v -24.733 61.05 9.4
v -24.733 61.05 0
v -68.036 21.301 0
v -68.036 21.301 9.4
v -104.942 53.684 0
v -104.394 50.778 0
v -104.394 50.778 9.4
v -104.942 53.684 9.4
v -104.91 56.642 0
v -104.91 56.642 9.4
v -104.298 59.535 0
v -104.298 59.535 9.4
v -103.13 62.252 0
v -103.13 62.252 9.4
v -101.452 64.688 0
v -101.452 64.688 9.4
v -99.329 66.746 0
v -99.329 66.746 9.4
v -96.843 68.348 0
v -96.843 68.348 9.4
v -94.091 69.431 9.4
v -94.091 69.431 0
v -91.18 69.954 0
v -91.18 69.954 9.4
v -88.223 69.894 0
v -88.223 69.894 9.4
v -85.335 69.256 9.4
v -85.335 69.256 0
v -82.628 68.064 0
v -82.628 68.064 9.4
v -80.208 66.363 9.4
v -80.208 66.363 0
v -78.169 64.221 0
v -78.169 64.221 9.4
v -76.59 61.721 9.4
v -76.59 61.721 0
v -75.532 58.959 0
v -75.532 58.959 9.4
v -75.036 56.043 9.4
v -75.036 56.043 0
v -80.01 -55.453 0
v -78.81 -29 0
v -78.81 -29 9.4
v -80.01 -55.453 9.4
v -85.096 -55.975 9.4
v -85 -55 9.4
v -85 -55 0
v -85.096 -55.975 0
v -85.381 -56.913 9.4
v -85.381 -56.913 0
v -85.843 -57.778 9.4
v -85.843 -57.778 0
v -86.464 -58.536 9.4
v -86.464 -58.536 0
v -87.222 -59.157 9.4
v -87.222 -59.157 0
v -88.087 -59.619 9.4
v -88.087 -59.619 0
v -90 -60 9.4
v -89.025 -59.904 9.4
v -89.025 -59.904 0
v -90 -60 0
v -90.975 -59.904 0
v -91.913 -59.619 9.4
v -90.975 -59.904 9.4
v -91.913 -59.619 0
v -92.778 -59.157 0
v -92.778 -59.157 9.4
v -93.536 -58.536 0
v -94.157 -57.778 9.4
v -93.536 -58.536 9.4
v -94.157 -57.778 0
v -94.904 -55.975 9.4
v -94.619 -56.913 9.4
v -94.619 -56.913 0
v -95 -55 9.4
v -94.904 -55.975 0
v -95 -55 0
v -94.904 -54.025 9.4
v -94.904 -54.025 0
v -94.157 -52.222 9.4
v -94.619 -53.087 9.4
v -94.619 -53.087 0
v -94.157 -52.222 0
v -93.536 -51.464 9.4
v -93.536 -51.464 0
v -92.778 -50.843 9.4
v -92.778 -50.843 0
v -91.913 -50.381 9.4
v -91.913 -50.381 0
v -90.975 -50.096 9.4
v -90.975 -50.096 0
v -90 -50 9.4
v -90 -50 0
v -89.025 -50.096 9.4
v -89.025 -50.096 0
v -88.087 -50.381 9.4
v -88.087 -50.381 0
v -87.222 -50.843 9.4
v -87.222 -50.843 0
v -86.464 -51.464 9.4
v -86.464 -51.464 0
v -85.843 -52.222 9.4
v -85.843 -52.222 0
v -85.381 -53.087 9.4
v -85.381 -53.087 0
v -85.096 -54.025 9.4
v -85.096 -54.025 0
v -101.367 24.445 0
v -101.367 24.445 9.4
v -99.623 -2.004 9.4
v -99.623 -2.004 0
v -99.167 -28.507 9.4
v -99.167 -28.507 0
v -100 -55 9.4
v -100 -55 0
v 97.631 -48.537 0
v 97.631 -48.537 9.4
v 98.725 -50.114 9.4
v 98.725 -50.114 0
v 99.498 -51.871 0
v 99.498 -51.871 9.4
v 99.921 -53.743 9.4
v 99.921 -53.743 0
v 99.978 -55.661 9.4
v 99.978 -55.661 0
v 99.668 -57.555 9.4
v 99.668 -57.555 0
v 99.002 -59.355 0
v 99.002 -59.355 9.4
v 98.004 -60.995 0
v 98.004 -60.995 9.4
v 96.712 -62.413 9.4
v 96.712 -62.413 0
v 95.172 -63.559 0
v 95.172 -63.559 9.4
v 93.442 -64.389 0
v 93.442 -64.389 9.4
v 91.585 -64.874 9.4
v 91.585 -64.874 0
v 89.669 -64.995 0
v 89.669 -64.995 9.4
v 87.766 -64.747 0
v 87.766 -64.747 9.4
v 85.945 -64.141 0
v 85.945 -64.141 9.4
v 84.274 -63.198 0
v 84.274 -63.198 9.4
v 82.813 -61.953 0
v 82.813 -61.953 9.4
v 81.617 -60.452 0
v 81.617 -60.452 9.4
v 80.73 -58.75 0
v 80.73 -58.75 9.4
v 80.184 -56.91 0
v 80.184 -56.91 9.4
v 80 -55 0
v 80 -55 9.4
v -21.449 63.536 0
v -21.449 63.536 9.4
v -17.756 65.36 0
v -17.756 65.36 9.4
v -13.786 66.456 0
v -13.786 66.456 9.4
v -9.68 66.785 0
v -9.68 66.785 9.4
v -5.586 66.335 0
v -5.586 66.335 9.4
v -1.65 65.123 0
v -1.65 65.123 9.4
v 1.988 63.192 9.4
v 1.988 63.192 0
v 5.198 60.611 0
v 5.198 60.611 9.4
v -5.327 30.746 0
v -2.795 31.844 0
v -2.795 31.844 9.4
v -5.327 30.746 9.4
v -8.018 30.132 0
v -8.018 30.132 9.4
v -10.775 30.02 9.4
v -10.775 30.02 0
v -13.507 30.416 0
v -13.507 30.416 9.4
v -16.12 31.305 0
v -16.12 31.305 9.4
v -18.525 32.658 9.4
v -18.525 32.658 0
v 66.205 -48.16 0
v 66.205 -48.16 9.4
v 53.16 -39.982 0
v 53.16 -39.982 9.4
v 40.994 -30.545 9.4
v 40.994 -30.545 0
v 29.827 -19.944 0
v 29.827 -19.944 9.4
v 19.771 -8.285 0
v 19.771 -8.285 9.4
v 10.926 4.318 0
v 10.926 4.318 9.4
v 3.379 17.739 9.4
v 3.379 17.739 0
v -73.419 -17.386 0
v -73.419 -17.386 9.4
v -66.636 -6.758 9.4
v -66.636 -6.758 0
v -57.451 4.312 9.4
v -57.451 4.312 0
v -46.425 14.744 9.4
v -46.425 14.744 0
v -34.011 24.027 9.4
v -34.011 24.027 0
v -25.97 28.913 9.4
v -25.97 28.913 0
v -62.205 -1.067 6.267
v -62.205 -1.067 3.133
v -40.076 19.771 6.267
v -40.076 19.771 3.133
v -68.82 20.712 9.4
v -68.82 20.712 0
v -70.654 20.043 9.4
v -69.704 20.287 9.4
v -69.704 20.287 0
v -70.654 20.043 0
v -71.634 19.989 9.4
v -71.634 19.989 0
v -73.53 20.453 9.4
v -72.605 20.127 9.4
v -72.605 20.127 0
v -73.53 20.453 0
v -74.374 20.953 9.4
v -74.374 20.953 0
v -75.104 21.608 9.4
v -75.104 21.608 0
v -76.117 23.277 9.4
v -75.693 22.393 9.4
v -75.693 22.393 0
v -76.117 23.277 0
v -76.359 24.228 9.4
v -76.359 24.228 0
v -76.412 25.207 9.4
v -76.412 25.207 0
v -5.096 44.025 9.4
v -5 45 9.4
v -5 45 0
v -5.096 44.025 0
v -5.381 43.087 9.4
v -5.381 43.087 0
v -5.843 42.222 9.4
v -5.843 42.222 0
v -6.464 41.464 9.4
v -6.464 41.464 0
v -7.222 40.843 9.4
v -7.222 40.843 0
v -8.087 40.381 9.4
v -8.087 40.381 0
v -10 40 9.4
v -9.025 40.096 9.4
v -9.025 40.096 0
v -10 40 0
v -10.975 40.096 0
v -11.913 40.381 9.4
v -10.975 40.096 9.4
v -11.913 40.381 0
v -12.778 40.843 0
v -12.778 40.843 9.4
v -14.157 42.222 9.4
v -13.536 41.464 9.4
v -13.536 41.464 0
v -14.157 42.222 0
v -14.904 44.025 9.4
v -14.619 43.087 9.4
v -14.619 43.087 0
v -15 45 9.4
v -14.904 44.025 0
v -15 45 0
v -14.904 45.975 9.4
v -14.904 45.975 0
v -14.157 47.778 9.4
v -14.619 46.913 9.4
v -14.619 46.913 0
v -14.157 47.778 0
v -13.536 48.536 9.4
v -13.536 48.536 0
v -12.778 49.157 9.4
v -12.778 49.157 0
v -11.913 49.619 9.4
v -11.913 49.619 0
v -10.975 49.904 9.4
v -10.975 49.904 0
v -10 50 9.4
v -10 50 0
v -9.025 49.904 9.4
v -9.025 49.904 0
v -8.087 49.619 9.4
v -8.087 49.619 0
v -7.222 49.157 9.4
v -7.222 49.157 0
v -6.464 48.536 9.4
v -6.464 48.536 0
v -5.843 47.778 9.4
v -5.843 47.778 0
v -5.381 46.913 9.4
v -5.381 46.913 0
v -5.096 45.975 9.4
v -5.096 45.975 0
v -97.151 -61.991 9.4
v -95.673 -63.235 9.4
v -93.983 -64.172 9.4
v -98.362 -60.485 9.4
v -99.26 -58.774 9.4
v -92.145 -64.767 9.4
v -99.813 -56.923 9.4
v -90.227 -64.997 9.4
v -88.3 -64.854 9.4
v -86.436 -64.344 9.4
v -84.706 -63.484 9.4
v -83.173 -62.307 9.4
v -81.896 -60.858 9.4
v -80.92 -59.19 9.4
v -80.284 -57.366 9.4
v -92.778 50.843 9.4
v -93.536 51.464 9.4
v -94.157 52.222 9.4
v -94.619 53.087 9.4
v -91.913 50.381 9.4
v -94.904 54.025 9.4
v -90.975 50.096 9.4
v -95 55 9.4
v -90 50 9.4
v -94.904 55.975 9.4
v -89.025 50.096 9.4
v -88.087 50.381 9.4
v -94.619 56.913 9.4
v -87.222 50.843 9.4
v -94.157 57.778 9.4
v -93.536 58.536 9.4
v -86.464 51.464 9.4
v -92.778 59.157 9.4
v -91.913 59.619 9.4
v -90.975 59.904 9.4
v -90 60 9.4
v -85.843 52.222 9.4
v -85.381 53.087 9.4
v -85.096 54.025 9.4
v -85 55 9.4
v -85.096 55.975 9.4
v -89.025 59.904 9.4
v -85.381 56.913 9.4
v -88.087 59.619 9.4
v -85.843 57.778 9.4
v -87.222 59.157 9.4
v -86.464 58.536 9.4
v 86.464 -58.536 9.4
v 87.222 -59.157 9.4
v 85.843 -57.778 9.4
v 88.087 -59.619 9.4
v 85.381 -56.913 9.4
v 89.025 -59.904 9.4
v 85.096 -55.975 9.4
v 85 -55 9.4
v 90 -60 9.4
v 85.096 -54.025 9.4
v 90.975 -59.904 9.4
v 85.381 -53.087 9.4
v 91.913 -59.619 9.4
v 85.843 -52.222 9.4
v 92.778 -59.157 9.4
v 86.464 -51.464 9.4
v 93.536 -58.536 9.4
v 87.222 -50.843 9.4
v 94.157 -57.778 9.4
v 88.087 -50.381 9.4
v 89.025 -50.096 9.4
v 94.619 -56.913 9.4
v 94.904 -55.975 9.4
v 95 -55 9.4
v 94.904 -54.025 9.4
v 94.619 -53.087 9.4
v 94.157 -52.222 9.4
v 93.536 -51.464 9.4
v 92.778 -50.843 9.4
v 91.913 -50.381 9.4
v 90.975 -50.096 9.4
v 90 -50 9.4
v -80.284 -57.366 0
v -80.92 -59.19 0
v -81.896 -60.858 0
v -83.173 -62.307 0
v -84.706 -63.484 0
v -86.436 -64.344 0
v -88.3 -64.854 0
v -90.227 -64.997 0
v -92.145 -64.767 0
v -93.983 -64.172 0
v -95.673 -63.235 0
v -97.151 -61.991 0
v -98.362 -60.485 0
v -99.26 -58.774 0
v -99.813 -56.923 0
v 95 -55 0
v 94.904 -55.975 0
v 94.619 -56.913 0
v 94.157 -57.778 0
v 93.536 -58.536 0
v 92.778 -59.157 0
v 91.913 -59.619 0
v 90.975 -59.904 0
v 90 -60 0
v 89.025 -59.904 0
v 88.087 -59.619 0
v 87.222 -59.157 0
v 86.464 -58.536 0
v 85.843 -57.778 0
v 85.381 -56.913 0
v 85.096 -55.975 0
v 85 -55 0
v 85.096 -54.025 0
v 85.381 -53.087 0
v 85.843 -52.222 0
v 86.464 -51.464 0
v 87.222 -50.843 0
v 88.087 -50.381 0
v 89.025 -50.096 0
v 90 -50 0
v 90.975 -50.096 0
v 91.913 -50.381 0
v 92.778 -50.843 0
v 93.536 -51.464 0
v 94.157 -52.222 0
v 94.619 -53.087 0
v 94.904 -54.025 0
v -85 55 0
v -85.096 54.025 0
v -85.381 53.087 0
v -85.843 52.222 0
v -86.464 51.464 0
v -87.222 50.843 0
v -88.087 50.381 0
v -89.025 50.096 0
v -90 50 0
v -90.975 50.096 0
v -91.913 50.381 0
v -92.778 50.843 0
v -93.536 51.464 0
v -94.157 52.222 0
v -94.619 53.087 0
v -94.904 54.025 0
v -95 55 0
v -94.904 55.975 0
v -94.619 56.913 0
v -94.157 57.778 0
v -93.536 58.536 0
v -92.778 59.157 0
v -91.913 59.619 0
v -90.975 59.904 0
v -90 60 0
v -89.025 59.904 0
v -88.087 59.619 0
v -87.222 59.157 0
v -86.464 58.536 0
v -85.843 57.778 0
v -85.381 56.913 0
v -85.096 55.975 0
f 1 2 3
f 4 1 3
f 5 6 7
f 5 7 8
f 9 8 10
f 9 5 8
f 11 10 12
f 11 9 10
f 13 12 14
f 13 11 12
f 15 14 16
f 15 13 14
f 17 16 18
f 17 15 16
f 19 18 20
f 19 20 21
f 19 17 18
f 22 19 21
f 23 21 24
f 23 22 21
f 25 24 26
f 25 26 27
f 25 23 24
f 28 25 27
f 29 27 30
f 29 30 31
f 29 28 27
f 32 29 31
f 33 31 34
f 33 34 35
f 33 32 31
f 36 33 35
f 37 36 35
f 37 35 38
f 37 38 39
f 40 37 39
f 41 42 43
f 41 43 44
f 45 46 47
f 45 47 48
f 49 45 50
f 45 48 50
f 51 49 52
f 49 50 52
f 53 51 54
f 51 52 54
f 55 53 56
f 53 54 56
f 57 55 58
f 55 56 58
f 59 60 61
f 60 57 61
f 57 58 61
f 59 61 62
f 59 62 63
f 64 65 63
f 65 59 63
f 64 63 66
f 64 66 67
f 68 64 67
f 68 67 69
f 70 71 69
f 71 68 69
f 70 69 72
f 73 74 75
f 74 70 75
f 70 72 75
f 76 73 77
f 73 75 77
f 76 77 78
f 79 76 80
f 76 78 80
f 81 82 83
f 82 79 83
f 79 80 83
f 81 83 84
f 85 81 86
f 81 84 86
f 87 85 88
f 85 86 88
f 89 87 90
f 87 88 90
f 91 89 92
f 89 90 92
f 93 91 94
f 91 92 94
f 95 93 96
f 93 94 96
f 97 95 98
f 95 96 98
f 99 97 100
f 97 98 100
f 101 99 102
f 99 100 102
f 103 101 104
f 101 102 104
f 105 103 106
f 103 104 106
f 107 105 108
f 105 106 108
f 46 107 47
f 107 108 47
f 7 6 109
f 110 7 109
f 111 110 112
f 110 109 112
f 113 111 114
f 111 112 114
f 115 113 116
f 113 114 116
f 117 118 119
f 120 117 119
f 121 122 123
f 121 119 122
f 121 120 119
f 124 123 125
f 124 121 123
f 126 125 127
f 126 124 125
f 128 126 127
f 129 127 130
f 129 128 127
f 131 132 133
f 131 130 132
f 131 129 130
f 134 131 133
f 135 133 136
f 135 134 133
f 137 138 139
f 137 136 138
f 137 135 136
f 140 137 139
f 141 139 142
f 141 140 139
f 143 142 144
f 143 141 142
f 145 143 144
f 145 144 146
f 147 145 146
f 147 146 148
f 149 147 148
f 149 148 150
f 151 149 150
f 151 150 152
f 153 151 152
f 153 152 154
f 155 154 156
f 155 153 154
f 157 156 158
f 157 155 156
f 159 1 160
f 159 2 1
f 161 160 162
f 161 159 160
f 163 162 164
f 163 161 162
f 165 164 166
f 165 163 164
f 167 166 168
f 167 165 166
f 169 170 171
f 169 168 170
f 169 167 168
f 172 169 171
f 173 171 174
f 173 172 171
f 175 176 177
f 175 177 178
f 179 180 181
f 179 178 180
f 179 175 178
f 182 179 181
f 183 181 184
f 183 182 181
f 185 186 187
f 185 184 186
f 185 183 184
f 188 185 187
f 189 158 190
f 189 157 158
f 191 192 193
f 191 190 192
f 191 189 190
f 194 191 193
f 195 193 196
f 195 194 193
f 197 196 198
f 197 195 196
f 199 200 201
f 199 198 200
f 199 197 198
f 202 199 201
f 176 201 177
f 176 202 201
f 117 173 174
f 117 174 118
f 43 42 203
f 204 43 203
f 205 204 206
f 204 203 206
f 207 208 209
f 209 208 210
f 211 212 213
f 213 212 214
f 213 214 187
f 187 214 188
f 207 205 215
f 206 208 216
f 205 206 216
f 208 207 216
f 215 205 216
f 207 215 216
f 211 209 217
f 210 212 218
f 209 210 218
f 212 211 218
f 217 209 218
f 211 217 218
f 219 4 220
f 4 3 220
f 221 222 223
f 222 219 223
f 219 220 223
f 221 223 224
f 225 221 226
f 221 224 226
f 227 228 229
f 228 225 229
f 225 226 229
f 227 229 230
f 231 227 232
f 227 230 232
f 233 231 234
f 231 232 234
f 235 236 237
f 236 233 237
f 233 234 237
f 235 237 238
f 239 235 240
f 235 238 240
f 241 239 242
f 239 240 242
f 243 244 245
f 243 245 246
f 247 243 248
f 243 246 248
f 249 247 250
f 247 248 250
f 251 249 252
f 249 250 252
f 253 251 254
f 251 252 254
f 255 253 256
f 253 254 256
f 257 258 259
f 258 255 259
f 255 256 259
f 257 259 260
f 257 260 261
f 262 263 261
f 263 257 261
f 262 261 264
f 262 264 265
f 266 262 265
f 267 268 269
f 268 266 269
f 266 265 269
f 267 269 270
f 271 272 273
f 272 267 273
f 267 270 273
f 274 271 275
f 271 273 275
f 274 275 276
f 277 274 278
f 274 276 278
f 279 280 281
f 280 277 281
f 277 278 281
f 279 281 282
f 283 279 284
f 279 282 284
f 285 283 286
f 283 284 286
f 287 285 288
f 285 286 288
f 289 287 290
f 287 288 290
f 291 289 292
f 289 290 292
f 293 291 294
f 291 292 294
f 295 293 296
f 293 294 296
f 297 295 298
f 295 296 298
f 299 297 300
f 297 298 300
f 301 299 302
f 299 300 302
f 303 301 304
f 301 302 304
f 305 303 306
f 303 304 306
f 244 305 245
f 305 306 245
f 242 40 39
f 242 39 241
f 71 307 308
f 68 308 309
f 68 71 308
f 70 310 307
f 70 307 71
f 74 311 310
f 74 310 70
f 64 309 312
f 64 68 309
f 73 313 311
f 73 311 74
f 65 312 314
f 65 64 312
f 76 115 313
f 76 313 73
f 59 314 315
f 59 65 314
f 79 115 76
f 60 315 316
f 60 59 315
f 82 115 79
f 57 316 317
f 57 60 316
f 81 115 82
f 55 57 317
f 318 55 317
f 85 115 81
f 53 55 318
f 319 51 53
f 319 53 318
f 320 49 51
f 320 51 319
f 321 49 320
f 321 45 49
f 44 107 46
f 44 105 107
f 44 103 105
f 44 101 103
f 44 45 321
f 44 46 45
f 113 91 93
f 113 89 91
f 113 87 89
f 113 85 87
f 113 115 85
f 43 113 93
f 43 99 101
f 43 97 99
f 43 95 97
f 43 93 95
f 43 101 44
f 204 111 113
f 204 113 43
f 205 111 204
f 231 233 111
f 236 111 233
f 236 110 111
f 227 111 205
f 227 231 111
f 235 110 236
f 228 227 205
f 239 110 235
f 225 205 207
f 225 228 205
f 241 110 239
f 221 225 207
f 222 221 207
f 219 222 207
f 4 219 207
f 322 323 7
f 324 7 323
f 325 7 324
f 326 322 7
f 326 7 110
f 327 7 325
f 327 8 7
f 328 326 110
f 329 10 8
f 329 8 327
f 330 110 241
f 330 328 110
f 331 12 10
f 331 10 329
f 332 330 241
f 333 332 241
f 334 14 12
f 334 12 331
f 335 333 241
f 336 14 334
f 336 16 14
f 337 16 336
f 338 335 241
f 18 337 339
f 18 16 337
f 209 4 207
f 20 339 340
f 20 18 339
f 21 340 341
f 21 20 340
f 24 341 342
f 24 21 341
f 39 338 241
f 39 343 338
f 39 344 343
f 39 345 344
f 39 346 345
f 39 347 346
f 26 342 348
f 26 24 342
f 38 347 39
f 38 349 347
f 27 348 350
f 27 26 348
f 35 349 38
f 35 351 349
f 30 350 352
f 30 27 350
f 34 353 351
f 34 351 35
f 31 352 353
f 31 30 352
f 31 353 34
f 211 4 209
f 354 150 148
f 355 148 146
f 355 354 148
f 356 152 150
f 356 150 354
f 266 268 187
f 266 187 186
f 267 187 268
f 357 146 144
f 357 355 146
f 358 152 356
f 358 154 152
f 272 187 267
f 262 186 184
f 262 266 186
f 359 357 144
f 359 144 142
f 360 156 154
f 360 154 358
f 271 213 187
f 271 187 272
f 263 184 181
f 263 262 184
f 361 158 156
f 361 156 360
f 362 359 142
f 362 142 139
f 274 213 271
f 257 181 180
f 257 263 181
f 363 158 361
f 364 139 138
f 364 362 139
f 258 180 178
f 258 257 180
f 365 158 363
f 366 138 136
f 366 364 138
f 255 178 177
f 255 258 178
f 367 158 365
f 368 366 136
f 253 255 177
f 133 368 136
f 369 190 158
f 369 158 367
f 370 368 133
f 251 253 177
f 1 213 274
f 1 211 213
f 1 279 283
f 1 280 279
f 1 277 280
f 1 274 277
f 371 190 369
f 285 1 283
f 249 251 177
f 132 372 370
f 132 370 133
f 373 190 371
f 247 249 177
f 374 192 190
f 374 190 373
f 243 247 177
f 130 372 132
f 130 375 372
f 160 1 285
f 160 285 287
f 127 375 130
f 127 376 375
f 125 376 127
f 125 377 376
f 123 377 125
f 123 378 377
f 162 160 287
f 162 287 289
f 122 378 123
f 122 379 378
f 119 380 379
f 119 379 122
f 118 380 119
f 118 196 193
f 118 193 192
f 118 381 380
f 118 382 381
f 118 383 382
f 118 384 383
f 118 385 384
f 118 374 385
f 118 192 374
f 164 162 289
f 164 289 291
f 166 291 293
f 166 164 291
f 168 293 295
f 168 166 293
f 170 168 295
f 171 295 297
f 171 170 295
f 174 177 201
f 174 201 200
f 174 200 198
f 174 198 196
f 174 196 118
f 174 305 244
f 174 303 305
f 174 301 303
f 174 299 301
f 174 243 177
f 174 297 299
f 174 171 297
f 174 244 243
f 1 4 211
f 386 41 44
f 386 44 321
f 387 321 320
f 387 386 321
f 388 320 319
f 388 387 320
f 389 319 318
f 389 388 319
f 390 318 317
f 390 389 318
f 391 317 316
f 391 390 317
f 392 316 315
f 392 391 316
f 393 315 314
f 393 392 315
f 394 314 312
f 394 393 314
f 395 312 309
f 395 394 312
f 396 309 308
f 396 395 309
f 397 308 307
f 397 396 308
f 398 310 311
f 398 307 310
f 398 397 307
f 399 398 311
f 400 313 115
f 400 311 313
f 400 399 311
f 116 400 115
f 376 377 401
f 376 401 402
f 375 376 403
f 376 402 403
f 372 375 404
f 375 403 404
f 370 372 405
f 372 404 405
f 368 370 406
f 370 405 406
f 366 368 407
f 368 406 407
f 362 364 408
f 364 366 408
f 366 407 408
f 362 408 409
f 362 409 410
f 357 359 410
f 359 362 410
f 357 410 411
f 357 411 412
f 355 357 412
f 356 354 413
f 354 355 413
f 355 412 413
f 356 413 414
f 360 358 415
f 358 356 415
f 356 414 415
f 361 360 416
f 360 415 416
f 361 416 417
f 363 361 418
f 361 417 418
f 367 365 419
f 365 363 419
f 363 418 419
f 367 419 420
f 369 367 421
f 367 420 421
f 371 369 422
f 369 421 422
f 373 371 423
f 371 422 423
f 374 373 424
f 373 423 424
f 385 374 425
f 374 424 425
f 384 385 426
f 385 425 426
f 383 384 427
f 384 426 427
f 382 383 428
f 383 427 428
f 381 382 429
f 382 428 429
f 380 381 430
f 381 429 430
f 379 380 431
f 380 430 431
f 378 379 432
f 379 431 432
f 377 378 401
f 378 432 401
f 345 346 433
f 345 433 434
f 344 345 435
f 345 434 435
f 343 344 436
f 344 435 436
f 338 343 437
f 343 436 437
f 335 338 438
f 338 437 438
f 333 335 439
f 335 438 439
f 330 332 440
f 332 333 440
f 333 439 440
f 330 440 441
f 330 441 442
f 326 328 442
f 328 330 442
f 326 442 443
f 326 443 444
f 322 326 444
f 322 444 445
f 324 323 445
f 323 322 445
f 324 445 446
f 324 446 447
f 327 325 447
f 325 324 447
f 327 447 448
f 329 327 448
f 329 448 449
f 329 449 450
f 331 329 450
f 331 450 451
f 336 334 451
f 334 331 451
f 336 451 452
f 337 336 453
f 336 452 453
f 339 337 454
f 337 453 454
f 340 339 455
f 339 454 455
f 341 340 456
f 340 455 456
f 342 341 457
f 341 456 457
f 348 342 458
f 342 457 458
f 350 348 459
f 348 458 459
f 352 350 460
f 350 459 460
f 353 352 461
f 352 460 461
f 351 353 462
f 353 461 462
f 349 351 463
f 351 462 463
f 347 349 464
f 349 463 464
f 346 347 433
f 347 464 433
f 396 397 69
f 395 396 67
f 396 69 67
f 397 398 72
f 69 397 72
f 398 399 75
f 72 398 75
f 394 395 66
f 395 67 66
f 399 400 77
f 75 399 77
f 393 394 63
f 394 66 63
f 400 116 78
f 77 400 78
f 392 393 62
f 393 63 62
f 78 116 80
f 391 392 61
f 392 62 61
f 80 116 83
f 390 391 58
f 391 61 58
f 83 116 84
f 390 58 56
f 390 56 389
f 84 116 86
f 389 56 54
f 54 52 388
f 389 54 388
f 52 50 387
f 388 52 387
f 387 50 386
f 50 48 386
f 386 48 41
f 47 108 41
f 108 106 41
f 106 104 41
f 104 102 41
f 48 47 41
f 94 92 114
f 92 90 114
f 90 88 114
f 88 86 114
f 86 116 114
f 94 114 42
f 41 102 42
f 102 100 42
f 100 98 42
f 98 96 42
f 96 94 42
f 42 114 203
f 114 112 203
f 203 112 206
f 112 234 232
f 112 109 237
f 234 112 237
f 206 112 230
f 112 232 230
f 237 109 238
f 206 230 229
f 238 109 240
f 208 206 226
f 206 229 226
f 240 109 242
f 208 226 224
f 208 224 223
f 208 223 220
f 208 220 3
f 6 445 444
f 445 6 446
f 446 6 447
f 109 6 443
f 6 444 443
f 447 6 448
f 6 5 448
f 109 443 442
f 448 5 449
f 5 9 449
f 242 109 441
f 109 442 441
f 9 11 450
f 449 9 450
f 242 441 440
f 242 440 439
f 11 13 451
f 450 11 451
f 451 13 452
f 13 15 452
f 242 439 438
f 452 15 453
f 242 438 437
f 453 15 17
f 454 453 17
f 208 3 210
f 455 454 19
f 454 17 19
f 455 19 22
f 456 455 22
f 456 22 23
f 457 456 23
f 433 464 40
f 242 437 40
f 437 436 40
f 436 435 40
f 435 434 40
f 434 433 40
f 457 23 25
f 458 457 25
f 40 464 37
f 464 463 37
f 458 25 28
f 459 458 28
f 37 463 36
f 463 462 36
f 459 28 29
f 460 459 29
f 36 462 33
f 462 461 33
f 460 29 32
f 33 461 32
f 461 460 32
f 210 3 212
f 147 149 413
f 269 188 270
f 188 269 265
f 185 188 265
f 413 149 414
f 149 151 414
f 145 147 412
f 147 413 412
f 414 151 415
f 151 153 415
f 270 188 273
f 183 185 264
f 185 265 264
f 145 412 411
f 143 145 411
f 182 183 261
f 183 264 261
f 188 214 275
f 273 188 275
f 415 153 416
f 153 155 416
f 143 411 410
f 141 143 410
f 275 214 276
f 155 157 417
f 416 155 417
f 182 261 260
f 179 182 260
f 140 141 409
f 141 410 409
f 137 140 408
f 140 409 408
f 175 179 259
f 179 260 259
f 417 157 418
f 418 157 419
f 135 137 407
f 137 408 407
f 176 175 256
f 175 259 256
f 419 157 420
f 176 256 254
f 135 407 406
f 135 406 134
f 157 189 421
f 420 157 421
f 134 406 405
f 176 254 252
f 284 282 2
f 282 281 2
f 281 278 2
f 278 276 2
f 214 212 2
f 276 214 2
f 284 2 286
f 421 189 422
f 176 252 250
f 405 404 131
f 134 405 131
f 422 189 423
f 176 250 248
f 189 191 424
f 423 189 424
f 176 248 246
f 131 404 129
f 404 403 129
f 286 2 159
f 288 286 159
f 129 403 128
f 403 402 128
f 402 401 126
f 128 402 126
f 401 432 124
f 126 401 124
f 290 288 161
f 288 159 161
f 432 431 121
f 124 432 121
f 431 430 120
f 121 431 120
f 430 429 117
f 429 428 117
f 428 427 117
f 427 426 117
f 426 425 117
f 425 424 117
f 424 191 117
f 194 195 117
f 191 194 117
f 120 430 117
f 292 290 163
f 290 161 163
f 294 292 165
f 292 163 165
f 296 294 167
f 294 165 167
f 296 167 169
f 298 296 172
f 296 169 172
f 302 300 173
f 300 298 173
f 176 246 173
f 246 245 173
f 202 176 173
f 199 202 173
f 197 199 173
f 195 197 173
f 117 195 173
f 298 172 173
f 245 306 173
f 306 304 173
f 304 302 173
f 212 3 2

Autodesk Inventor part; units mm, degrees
ref_plane "YZ Plane" through (0, 0, 0) normal (1, 0, 0) x (0, 1, 0)
ref_plane "XZ Plane" through (0, 0, 0) normal (0, 1, 0) x (-1, 0, 0)
ref_plane "XY Plane" through (0, 0, 0) normal (0, 0, 1) x (1, 0, 0)
sketch "Sketch1" plane through (0, 0, 0) normal (0, 0, 1) x (1, 0, 0)
  line L0 (-110, 70) -> (110, 70) construction
  line L1 (110, 70) -> (110, -70) construction
  line L2 (110, -70) -> (-110, -70) construction
  line L3 (-110, -70) -> (-110, 70) construction
  circle A0 centre (-90, 55) radius 5
  circle A1 centre (-90, -55) radius 5
  circle A2 centre (90, -55) radius 5
  circle A3 centre (-10, 45) radius 5
  line L4 (-67, 0) -> (-42, 0) construction
  line L5 (-42, 0) -> (-42, -30) construction
  line L6 (-42, -30) -> (-67, -30) construction
  line L7 (-67, -30) -> (-67, 0) construction
  circle A4 centre (-54.5, -19) radius 10 construction
  arc A5 (-75.0363, 56.0433) -> (-104.3936, 50.7781) centre (-90, 55) ccw
  arc A6 (-99.9402, -53.9078) -> (-80.0103, -55.4531) centre (-90, -55) ccw
  arc A7 (-100, -55) -> (-105, 55) centre (-644.4063, -24.6321) ccw
  line L8 (-78.8103, -29) -> (-67, 2.1947) construction
  line L9 (-67, 2.1947) -> (-37.7539, 24.0313) construction
  line L10 (-37.7539, 24.0313) -> (-18.5252, 32.6582) construction
  spline S0 degree 3 poles (-78.8103, -29) (-67, 2.1947) (-37.7539, 24.0313) (-18.5252, 32.6582) knots 1 1 1 1 2 2 2 2
  line L11 (-24.7333, 61.0503) -> (-68.0357, 21.3009)
  line L12 (-75.0363, 56.0433) -> (-76.412, 25.2072)
  line L13 (-78.8103, -29) -> (-80.0103, -55.4531)
  arc A8 (80, -55) -> (97.6312, -48.5374) centre (90, -55) ccw
  line L14 (5.1977, 60.6112) -> (97.6312, -48.5374)
  arc A9 (-2.7947, 31.8439) -> (80, -55) centre (141.6446, 86.6595) ccw
  arc A10 (-18.5252, 32.6582) -> (-2.7947, 31.8439) centre (-10, 45) ccw
  arc A11 (5.1977, 60.6112) -> (-24.7333, 61.0503) centre (-10, 45) ccw
  arc A12 (-76.412, 25.2072) -> (-68.0357, 21.3009) centre (-71.4169, 24.9844) ccw
  point P0 (0, 0)
  dimension "d1" = 70
  dimension "d2" = 70
  dimension "d3" = 110
  dimension "d4" = 110
  dimension "d5" = 10
  dimension "d6" = 10
  dimension "d7" = 10
  dimension "d8" = 10
  dimension "d9" = 55
  dimension "d10" = 55
  dimension "d11" = 55
  dimension "d12" = 180
  dimension "d13" = 90
  dimension "d15" = 10
  dimension "d16" = 45
  dimension "d17" = 42
  dimension "d18" = 30
  dimension "d19" = 0
  dimension "d20" = 25
  dimension "d21" = 20
  dimension "d25" = 19
  dimension "d26" = 12.5
  dimension "d67" = 90
  dimension "d68" = 30
  dimension "d70" = 20
  dimension "d71" = 20
  dimension "d74" = 10
extrude "Extrusion6" add sketch "Sketch1" along normal blind 9.4 contours L12 A12 L11 A11 L14 A8 A9 A10 S0 L13 A6 A7 A5 | A7 A5
equation "\"d1\" = d2"
equation "\"d4\" = d3"
equation "\"d10\" = d9"
equation "\"d11\" = d9"
equation "\"d26\" = 0.5 * d20"
properties part number "Bracket Concept MK8"
